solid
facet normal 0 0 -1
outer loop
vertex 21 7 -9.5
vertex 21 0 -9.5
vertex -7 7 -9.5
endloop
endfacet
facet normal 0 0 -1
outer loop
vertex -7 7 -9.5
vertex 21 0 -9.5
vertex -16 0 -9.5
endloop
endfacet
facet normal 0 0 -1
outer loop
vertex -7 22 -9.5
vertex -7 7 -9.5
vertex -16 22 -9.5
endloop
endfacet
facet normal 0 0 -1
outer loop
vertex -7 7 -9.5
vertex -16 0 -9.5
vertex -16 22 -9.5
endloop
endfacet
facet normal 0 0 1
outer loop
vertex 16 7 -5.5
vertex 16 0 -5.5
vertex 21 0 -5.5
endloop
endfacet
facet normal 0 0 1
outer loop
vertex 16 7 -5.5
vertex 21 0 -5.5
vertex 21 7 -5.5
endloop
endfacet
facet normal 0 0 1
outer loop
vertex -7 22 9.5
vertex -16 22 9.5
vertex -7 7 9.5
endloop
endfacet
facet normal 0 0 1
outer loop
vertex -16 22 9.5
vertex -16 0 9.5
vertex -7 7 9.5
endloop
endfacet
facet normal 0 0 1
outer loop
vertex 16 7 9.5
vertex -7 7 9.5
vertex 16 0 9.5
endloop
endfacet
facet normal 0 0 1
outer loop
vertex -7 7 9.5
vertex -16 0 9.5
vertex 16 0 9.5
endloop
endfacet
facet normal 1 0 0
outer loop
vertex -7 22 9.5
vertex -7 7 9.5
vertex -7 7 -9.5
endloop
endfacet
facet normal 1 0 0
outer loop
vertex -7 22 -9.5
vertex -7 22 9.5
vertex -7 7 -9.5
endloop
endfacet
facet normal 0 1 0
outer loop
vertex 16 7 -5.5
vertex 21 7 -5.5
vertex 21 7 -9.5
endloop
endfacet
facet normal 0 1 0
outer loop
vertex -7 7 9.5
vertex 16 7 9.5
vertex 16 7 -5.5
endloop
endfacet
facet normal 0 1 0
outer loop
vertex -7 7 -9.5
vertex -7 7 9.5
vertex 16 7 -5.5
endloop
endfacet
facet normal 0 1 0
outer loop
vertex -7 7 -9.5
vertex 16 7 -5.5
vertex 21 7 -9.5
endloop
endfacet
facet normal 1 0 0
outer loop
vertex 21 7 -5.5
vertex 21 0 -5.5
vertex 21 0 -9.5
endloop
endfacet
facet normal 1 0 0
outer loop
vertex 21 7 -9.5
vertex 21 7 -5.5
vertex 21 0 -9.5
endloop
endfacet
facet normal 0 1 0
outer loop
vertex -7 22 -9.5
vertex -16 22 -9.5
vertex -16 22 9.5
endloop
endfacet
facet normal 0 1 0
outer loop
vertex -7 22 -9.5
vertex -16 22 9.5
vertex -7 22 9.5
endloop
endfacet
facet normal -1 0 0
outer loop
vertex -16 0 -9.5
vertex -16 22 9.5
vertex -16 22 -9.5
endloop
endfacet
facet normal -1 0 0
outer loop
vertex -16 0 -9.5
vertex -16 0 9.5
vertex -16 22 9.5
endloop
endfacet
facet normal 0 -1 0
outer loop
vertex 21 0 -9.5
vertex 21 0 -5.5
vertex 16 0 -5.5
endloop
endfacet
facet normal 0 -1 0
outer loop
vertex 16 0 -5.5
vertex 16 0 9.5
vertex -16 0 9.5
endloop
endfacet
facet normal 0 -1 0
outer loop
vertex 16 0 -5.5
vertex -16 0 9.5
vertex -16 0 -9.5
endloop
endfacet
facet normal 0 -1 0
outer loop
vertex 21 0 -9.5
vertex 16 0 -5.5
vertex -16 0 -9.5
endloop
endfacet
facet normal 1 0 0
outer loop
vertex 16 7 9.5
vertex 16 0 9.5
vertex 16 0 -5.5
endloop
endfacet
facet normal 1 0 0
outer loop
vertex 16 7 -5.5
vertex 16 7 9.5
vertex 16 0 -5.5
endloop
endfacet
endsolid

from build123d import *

# Parameters (mm, degrees)
SKETCH1_W           = 32
SKETCH1_H           = 19
BOSS_EXTRUDE1_DEPTH = 7
SKETCH2_W           = 9
SKETCH2_H           = 19
BOSS_EXTRUDE2_DEPTH = 15
SKETCH3_W           = 4
SKETCH3_H           = 7
BOSS_EXTRUDE3_DEPTH = 5


with BuildPart() as part:
    # Sketch1 → Boss-Extrude1 (new body)
    with BuildSketch(Plane(origin=(0, 0, 0), x_dir=(1, 0, 0), z_dir=(0, 1, 0))):
        Rectangle(SKETCH1_W, SKETCH1_H)
    extrude(amount=BOSS_EXTRUDE1_DEPTH)

    # Sketch2 → Boss-Extrude2 (add)
    with BuildSketch(Plane(origin=(0, 7, 0), x_dir=(1, 0, 0), z_dir=(0, 1, 0))):
        with Locations((-11.5, 0)):
            Rectangle(SKETCH2_W, SKETCH2_H)
    extrude(amount=BOSS_EXTRUDE2_DEPTH)

    # Sketch3 → Boss-Extrude3 (add)
    with BuildSketch(Plane(origin=(16, 0, 0), x_dir=(0, 0, -1), z_dir=(1, 0, 0))):
        with Locations((7.5, 3.5)):
            Rectangle(SKETCH3_W, SKETCH3_H)
    extrude(amount=BOSS_EXTRUDE3_DEPTH)


solid = part.part
